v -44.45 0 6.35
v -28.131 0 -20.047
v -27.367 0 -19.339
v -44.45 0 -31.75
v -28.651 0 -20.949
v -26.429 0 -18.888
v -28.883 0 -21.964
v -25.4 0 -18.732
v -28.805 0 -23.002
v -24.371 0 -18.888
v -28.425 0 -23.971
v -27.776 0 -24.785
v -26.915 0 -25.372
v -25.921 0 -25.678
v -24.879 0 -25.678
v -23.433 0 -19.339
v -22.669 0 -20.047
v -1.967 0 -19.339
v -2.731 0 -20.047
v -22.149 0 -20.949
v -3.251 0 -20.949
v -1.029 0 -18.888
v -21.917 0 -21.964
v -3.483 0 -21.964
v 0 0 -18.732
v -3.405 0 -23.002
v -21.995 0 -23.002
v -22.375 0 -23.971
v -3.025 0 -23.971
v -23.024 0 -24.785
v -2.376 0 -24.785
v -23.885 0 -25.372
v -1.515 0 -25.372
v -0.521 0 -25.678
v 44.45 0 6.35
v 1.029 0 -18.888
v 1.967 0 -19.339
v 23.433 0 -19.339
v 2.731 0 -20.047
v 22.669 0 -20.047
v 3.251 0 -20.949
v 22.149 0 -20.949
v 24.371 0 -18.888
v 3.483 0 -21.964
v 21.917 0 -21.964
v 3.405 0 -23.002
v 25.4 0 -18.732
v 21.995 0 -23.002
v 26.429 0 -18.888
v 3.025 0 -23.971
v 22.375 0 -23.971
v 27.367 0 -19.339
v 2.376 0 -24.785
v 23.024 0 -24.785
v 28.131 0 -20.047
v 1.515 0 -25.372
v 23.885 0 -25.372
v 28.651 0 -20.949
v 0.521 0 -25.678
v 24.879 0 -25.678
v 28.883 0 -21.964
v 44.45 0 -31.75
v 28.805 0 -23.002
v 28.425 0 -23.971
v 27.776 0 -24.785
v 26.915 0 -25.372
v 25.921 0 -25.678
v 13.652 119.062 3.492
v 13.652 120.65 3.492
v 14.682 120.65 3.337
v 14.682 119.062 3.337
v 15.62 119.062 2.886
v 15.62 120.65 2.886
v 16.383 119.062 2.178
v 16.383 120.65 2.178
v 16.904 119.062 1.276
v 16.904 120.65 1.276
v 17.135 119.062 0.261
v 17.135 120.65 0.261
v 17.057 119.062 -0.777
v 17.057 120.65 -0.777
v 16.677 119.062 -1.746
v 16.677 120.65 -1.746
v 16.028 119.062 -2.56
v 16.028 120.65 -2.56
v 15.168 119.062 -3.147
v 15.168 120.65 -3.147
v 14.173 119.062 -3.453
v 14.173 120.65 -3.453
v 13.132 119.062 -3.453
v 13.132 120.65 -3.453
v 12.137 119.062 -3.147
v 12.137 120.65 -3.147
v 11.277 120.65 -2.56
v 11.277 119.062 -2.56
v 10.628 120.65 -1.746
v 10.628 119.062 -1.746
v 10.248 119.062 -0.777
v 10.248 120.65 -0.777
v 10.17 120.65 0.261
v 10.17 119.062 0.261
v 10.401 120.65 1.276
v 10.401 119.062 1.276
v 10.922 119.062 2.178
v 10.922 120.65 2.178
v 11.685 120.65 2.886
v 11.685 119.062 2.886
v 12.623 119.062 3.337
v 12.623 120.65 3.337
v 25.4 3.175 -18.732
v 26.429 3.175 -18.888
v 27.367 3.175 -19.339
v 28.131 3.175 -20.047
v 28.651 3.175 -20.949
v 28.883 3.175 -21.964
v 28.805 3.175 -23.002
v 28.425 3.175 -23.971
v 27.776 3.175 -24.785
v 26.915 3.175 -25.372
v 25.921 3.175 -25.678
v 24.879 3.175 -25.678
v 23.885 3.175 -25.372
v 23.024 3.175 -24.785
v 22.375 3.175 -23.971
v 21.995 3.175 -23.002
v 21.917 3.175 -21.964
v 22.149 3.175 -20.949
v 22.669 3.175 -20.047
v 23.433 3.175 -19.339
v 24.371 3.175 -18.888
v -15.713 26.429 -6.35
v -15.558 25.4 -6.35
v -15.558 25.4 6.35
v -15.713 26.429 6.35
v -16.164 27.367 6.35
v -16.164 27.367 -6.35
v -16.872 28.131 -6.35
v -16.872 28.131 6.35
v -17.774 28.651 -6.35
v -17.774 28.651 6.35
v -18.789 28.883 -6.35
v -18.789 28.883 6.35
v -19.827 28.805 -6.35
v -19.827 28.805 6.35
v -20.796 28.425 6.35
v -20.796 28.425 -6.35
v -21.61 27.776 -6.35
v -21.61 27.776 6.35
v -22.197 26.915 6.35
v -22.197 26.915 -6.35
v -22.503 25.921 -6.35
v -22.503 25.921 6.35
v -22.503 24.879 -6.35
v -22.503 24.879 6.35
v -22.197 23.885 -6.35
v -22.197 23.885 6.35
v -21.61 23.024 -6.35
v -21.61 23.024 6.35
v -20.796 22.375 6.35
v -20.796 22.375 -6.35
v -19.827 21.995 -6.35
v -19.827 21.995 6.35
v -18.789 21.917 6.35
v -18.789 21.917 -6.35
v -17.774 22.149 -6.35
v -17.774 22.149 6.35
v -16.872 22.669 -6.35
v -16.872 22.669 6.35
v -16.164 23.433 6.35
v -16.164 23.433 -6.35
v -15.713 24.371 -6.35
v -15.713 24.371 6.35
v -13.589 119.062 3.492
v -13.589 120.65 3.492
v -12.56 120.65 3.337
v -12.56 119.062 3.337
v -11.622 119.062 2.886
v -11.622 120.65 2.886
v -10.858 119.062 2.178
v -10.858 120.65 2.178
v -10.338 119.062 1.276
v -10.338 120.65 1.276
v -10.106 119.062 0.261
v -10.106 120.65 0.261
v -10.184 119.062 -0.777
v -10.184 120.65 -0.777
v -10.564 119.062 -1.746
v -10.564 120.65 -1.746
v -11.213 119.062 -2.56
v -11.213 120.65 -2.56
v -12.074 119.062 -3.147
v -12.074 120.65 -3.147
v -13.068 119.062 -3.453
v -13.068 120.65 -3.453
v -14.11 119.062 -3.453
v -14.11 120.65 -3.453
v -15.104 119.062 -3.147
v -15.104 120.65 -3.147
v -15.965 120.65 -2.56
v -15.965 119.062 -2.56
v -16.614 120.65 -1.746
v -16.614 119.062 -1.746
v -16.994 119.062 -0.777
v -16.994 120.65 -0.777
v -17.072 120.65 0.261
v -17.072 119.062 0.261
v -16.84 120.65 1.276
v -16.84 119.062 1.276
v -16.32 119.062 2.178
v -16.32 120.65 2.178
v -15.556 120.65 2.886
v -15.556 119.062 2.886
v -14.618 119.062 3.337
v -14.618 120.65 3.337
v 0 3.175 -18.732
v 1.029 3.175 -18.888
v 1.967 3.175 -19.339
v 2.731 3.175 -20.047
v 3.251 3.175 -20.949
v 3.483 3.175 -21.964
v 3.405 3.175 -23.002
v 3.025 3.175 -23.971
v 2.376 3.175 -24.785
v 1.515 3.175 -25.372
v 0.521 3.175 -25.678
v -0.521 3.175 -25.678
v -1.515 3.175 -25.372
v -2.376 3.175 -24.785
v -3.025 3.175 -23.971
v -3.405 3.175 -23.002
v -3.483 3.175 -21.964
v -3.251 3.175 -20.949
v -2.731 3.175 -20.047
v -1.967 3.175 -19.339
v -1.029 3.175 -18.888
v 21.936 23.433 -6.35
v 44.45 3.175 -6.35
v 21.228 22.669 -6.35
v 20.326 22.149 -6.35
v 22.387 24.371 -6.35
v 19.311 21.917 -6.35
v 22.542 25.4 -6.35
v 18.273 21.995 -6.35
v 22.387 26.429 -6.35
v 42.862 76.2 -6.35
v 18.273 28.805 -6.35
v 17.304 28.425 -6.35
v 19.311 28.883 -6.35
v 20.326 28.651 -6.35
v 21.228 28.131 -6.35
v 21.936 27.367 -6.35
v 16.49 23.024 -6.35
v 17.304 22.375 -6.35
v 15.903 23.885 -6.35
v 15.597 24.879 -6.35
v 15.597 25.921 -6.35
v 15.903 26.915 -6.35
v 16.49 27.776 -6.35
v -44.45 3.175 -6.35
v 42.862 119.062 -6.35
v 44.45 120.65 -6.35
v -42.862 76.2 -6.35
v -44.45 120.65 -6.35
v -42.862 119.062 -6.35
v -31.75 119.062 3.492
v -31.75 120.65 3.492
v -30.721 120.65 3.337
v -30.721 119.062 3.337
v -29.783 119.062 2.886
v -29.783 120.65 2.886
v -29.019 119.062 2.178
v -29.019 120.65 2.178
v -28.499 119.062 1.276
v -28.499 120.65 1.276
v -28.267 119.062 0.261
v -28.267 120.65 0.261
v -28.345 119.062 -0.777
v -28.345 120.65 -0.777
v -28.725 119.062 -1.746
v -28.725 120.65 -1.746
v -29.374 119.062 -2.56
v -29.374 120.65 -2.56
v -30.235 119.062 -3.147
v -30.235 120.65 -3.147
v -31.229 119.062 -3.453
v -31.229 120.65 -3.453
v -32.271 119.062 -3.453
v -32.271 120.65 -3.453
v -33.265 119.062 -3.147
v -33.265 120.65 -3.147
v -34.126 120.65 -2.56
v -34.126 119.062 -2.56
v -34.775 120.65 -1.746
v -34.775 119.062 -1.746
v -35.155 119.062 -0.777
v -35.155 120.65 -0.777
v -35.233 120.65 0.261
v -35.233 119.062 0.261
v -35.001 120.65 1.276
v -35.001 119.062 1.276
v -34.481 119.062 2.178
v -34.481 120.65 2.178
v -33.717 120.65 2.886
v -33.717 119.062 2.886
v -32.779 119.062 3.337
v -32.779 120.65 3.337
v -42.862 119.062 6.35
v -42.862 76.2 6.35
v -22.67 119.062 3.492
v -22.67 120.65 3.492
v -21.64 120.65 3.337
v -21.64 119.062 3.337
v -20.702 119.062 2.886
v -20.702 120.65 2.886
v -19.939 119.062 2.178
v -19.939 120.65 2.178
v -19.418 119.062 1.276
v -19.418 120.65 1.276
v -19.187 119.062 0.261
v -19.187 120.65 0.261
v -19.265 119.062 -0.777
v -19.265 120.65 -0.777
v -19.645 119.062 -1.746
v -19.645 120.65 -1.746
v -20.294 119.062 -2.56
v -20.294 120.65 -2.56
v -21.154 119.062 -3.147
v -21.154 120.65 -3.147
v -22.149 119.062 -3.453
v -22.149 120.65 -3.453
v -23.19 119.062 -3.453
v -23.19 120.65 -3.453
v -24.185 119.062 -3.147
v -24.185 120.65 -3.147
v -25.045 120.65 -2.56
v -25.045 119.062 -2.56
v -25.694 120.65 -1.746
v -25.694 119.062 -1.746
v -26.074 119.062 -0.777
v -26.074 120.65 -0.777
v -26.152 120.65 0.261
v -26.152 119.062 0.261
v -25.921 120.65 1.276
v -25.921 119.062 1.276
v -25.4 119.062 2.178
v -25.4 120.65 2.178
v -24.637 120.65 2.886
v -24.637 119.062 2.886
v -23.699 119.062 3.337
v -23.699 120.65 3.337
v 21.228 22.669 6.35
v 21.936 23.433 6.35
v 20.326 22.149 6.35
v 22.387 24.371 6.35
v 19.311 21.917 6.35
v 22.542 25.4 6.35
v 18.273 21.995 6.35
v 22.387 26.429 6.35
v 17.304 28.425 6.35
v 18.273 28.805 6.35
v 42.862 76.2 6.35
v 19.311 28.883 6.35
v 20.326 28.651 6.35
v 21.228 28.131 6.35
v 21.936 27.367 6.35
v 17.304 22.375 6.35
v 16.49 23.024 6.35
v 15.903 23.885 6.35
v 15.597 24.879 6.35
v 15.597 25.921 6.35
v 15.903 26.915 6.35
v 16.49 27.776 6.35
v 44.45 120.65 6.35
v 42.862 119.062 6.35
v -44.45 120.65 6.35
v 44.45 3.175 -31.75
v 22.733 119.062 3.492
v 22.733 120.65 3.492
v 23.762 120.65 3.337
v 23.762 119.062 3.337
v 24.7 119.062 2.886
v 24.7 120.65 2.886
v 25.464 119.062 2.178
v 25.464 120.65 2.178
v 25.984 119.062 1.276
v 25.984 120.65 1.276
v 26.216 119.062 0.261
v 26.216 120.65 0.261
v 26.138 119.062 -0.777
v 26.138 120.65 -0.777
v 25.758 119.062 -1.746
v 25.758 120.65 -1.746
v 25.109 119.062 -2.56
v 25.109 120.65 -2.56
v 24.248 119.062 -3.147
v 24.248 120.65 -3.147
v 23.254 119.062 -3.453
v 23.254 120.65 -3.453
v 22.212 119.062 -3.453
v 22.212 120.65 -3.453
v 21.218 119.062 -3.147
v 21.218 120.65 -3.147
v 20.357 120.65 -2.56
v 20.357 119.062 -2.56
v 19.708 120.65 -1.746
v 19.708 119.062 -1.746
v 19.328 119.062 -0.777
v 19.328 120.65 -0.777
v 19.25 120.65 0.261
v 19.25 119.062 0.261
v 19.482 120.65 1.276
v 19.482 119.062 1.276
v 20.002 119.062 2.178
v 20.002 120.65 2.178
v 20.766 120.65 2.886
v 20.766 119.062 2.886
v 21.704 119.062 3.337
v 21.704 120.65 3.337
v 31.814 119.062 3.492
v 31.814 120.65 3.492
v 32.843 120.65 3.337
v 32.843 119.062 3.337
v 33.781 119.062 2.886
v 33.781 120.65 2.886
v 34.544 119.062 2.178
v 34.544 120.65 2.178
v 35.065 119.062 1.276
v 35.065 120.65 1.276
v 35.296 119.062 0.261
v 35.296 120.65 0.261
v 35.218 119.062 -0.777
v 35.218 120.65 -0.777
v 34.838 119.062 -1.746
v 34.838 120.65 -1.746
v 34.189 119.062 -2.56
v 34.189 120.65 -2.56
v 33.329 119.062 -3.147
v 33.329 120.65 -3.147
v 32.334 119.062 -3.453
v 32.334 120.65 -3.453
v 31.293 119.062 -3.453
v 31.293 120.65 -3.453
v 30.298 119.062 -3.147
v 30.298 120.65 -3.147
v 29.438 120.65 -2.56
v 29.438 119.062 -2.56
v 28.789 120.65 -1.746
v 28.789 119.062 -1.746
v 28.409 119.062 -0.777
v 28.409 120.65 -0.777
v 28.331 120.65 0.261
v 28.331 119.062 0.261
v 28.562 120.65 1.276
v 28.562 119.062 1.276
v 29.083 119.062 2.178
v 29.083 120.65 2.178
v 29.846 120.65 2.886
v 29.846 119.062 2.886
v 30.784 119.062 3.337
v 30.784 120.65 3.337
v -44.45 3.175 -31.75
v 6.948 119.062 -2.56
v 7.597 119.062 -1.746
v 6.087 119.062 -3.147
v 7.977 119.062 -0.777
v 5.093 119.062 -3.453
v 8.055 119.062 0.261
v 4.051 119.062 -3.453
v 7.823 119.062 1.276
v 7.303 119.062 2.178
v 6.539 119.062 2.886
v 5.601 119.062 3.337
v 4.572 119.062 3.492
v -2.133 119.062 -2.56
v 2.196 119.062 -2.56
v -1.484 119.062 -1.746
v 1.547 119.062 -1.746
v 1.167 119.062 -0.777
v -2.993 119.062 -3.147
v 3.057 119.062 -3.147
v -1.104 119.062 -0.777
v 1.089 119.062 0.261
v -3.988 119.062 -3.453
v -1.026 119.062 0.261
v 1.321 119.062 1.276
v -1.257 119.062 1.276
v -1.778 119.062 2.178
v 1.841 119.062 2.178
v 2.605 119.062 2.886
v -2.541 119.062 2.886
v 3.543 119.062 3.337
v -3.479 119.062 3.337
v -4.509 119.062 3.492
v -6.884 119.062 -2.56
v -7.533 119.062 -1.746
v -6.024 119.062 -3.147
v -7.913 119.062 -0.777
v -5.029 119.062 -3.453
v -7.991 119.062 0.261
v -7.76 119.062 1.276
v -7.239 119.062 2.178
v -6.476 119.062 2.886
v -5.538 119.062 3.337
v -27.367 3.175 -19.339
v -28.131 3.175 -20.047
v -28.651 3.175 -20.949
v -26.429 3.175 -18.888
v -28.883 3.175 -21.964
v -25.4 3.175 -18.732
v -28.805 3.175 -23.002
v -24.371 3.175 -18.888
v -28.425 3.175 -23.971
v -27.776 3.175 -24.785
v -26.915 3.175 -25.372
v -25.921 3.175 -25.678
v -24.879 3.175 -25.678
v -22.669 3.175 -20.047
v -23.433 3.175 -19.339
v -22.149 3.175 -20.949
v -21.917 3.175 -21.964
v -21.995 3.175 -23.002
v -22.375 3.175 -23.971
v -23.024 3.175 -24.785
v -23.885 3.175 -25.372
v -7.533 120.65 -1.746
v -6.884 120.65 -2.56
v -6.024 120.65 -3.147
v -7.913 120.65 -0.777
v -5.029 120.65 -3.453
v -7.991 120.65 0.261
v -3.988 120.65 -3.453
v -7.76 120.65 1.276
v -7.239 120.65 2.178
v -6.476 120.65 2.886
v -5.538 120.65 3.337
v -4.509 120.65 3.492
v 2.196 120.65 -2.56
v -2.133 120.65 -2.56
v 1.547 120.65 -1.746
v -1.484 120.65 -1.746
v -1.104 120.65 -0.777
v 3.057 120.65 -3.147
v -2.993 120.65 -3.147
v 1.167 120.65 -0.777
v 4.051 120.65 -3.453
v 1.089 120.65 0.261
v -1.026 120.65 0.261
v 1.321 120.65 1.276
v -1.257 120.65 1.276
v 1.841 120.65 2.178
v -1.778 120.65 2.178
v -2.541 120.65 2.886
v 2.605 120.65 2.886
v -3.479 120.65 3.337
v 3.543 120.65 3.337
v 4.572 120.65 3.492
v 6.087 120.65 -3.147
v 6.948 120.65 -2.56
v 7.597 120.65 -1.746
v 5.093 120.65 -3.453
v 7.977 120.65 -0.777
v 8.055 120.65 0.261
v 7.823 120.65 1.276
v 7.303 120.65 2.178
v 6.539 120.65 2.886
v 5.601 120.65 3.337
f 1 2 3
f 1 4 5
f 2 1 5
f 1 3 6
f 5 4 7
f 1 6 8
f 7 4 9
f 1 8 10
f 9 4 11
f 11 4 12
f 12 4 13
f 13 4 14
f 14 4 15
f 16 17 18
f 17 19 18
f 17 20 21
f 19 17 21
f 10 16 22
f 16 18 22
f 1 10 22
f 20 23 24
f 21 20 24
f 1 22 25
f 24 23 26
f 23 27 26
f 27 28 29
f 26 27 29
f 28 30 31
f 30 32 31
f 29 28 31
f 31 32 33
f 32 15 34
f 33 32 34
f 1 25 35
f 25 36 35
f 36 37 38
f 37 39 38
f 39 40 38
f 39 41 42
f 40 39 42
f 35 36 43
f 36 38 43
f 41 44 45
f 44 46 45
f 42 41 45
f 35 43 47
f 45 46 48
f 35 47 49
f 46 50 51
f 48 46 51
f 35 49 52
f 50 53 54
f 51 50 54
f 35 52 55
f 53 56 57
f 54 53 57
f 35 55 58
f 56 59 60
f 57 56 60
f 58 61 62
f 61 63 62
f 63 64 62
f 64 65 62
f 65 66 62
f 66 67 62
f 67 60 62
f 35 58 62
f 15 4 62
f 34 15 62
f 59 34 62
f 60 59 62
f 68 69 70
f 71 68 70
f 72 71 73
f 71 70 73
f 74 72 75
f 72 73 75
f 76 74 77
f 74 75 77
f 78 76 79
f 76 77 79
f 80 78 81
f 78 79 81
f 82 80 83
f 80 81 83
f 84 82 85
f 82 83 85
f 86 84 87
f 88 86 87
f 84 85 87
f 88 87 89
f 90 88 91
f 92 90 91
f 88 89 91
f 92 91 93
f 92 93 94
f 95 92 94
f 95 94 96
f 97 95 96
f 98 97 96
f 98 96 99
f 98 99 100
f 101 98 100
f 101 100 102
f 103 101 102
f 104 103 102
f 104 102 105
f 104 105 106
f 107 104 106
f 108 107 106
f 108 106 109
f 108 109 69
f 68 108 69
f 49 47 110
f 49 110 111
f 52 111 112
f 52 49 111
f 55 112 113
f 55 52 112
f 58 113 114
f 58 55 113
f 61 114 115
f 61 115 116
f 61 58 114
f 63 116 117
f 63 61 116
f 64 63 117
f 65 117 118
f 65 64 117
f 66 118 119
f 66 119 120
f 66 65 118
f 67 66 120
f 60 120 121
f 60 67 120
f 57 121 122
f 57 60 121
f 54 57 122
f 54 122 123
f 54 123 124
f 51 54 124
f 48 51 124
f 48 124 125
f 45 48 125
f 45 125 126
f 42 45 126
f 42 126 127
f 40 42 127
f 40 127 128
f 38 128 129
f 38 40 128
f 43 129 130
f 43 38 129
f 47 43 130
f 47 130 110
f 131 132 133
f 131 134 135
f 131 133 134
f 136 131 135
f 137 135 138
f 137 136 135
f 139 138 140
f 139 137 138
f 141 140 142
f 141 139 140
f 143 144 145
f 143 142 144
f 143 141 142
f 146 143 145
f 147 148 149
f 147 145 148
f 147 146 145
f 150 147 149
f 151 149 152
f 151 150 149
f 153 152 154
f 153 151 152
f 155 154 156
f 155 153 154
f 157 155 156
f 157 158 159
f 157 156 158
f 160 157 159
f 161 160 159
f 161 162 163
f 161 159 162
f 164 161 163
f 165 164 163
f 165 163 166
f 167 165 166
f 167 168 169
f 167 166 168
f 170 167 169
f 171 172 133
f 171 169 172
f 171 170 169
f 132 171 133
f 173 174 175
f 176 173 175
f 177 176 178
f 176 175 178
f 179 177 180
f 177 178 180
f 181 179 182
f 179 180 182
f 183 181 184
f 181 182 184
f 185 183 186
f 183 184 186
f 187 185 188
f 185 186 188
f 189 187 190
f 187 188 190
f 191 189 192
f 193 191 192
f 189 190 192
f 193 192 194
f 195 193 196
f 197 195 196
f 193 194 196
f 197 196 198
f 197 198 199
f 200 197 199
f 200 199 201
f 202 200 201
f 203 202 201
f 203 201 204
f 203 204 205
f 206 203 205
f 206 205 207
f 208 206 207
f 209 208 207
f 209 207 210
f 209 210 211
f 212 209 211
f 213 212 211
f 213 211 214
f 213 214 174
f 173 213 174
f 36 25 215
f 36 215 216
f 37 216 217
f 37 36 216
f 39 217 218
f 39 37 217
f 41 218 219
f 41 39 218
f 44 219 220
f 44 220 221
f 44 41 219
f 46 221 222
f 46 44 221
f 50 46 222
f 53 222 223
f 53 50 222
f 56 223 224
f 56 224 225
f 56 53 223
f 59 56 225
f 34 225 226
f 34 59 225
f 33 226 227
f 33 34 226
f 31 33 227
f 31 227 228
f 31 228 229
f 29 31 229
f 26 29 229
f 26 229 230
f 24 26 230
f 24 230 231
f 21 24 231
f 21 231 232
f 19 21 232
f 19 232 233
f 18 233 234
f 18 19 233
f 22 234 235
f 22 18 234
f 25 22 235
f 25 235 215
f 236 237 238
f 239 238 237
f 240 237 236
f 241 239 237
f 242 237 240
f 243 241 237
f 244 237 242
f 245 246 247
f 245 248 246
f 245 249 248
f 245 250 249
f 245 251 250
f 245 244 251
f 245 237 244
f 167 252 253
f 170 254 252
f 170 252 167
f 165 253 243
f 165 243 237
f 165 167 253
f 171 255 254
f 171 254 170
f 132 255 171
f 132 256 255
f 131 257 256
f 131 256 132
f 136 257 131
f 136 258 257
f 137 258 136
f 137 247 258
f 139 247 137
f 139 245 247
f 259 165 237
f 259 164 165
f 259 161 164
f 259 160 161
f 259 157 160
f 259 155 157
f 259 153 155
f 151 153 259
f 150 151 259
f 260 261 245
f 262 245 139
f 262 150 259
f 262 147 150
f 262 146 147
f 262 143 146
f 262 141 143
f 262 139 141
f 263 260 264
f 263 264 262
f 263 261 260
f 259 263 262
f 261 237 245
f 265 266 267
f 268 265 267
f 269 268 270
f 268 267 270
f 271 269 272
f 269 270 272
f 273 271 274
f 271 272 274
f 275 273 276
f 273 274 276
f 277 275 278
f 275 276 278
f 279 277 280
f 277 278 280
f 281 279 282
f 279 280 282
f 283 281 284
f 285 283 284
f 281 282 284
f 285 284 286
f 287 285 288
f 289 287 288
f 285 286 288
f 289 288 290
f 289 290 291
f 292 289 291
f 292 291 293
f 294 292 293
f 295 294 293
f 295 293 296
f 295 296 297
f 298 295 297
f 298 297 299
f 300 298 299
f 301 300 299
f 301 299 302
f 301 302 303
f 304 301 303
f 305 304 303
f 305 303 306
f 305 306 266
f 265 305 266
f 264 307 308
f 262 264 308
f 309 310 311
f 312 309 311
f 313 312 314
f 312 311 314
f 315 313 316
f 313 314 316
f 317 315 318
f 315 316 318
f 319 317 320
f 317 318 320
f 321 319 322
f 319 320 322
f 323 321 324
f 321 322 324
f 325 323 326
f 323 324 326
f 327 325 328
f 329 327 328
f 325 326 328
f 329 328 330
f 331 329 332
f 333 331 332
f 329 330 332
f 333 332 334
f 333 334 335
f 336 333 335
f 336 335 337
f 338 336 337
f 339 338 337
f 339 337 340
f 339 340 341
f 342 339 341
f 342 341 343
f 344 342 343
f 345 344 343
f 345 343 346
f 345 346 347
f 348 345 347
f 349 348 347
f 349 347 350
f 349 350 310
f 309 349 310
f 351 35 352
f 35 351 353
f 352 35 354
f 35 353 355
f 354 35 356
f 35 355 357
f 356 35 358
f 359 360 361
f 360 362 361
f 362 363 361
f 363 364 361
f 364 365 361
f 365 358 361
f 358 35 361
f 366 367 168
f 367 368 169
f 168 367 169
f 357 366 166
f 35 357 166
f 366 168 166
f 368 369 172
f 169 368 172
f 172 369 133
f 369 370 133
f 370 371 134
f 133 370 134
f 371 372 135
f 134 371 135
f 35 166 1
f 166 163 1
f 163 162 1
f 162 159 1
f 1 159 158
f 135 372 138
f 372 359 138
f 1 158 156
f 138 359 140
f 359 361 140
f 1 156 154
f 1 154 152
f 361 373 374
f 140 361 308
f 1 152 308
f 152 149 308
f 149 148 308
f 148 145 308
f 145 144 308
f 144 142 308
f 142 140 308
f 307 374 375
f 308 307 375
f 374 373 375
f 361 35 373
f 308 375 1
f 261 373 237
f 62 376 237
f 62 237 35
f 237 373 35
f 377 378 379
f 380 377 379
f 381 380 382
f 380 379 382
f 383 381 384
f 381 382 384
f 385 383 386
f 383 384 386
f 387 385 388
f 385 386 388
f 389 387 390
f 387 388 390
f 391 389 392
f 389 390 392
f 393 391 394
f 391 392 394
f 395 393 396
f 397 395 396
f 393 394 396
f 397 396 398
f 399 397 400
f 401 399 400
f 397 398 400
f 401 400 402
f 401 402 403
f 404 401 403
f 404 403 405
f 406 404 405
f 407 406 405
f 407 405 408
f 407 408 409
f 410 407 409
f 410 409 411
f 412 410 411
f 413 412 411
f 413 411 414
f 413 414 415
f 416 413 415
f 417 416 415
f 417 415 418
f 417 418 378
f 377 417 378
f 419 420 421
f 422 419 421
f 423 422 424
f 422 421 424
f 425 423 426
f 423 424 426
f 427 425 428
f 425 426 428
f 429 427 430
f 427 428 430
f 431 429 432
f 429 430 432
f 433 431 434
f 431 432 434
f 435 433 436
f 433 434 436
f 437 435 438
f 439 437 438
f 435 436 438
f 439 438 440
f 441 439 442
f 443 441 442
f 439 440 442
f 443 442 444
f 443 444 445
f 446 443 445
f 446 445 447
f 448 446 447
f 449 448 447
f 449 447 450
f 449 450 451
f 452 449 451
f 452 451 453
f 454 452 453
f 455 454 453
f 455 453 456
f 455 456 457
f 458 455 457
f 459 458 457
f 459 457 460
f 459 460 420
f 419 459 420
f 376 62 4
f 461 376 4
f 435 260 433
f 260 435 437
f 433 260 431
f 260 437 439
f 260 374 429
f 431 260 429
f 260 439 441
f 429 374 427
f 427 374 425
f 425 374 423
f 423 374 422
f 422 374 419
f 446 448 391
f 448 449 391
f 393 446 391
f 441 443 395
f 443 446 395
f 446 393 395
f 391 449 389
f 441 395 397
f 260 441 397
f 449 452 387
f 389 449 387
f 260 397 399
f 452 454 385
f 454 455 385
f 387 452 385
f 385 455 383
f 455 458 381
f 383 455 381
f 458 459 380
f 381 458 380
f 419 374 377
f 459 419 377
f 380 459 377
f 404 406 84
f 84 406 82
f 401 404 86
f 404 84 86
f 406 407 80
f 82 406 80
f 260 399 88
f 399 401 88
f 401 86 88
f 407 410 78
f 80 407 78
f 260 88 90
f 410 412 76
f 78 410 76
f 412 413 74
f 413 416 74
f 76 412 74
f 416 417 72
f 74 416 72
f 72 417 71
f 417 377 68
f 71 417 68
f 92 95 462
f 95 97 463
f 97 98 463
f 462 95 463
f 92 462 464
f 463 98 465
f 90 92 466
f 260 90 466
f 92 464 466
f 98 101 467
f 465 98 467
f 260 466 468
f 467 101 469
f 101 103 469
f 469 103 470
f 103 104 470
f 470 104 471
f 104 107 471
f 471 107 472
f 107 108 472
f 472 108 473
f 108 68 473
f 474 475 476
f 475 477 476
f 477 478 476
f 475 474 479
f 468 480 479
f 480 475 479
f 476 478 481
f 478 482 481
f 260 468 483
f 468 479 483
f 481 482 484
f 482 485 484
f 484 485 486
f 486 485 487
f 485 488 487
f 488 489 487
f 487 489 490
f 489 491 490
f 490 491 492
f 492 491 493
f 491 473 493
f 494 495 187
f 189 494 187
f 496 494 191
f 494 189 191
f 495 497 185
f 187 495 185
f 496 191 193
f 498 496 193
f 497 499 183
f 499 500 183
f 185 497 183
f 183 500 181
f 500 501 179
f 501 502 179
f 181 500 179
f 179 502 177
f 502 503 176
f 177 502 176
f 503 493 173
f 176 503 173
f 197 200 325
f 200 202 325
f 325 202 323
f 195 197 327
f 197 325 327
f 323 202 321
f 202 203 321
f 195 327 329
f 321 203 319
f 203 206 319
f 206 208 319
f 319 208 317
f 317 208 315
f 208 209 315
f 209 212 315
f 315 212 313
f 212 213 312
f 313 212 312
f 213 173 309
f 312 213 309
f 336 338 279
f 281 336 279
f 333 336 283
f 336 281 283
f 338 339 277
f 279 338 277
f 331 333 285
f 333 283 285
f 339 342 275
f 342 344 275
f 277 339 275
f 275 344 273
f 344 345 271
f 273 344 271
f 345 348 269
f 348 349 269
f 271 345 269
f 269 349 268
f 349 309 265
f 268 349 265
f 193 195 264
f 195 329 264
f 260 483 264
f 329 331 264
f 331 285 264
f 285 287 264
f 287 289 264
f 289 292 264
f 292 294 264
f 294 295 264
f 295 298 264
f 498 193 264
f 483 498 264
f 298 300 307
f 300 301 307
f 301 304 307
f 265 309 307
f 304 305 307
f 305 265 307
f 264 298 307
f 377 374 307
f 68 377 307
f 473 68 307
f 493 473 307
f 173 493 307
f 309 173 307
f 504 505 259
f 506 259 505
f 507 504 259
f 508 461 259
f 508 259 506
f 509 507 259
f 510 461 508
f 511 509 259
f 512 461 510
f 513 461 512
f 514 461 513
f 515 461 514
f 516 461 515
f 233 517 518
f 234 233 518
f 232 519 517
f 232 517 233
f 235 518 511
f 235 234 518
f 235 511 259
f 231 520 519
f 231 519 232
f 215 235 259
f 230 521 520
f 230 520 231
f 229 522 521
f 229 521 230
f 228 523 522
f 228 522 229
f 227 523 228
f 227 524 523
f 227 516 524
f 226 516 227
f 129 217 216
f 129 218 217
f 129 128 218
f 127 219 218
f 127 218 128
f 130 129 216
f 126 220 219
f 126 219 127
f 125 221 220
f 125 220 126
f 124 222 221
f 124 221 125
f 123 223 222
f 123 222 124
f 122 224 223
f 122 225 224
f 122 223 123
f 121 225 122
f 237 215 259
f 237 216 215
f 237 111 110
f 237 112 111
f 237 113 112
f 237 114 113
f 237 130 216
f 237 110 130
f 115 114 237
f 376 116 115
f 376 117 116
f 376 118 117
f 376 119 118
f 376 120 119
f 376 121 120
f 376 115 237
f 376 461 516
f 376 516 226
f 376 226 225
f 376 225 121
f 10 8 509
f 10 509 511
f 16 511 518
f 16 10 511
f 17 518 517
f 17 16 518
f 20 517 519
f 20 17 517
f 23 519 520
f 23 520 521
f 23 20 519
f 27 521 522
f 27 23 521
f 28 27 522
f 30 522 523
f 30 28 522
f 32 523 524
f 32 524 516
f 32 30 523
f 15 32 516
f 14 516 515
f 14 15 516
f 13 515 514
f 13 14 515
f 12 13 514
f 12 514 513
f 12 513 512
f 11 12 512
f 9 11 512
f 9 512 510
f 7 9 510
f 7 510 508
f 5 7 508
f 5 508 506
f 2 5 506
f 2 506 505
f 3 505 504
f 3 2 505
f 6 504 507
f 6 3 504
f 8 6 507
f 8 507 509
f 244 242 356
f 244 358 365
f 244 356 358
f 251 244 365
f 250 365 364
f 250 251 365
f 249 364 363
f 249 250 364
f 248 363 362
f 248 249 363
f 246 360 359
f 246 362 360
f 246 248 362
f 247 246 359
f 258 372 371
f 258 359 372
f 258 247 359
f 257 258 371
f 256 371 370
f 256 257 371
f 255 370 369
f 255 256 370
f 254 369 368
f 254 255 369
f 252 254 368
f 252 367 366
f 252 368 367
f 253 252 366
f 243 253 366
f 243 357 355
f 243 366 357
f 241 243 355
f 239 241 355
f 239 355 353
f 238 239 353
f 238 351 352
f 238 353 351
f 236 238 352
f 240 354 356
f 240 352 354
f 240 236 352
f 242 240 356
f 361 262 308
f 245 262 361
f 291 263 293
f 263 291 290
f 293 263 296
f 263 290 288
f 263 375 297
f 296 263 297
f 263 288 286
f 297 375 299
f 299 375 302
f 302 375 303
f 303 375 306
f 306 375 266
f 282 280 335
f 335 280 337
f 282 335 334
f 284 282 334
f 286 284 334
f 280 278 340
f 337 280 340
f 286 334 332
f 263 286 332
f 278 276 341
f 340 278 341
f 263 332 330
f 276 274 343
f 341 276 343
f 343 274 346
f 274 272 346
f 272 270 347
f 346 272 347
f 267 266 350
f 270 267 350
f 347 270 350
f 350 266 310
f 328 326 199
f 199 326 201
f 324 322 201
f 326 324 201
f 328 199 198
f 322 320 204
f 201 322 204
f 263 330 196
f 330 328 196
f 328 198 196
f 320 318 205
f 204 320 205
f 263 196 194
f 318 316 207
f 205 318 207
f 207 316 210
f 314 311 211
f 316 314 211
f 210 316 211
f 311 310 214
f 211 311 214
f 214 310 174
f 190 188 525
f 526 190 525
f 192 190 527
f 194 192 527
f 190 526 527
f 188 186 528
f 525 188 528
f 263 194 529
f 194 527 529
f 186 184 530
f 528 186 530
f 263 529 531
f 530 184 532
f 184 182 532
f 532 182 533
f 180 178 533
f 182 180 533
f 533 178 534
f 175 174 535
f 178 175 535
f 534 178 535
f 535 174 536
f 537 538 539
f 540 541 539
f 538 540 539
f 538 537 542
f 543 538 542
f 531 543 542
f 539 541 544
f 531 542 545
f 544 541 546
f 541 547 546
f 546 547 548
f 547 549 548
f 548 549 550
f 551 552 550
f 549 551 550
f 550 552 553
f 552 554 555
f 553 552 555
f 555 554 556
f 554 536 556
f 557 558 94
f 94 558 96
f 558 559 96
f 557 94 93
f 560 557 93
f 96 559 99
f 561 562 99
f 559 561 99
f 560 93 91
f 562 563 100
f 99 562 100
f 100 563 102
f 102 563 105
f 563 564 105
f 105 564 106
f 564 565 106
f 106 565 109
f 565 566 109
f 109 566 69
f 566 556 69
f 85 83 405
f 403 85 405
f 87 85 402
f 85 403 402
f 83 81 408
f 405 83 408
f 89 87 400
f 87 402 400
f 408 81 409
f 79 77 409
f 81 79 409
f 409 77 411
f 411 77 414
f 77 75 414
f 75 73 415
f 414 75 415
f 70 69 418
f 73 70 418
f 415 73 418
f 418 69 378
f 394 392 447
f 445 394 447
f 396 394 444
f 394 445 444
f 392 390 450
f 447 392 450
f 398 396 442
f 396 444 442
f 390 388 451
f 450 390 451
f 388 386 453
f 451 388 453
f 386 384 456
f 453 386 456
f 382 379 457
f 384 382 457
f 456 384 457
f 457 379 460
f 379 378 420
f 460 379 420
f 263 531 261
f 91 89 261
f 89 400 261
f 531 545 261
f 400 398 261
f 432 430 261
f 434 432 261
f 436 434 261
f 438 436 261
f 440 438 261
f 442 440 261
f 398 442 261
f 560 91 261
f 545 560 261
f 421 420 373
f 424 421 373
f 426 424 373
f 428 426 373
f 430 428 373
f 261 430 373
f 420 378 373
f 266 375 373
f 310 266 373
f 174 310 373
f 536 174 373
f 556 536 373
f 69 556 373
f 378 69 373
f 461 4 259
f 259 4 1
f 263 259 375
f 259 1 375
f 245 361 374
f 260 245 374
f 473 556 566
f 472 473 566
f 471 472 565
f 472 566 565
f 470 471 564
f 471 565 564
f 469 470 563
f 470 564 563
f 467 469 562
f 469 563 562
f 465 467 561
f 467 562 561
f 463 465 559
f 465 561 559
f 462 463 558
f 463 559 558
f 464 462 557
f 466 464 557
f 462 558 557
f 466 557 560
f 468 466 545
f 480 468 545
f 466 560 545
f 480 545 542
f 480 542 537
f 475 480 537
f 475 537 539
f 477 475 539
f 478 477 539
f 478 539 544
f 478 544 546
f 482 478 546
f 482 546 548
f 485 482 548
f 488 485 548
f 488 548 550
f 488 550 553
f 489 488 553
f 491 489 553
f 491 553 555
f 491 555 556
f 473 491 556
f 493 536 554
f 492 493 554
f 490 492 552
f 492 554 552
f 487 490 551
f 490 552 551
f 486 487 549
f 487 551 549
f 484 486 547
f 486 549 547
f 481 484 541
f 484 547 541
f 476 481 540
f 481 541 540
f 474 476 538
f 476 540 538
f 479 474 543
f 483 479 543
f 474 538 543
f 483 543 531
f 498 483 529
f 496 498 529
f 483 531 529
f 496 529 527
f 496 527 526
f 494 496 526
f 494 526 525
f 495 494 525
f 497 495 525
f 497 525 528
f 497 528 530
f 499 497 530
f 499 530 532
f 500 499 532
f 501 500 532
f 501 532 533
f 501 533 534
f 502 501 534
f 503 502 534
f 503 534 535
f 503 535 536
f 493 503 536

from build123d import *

# Parameters (mm, degrees)
SKETCH1_W               = 88.9
SKETCH1_H               = 12.7
BOSS_EXTRUDE1_DEPTH     = 76.2
SKETCH2_R               = 3.4925
BOSS_EXTRUDE4_DEPTH     = 3.175
BOSS_EXTRUDE5_DEPTH     = 12.7
CUT_EXTRUDE1_REACH      = 134.44
SKETCH4_R               = 3.4925
CUT_EXTRUDE2_DEPTH      = 133.439750453
CUT_EXTRUDE2_DEPTH_BACK = 133.439750453
SKETCH5_R               = 3.4925


with BuildPart() as part:
    # Sketch1 → Boss-Extrude1 (new body)
    with BuildSketch(Plane(origin=(0, 0, 0), x_dir=(1, 0, 0), z_dir=(0, 1, 0))):
        Rectangle(SKETCH1_W, SKETCH1_H)
    extrude(amount=BOSS_EXTRUDE1_DEPTH)

    # Sketch2 → Boss-Extrude4 (add)
    with BuildSketch(Plane(origin=(0, 0, 0), x_dir=(1, 0, 0), z_dir=(0, 1, 0))):
        Polygon((-44.45, 22.225), (-44.45, 6.35), (44.45, 6.35), (44.45, 31.75), (-44.45, 31.75), align=None)
        with Locations(Location((-25.4, 22.225, 0), (0, 0, 270))):
            Circle(SKETCH2_R, mode=Mode.SUBTRACT)
        with Locations(Location((0, 22.225, 0), (0, 0, 270))):
            Circle(SKETCH2_R, mode=Mode.SUBTRACT)
        with Locations(Location((25.4, 22.225, 0), (0, 0, 270))):
            Circle(SKETCH2_R, mode=Mode.SUBTRACT)
    extrude(amount=BOSS_EXTRUDE4_DEPTH)

    # Sketch3 → Boss-Extrude5 (add)
    with BuildSketch(Plane.XY.offset(6.35)):
        Polygon((-44.45, 76.2), (-44.45, 120.65), (44.45, 120.65), (44.45, 76.2), (42.8625, 76.2), (42.8625, 119.0625), (-42.8625, 119.0625), (-42.8625, 76.2), align=None)
    extrude(amount=-BOSS_EXTRUDE5_DEPTH)

    # Sketch4 → Cut-Extrude1 (cut, up to next)
    with BuildSketch(Plane(origin=(0, 120.65, 0), x_dir=(1, 0, 0), z_dir=(0, 1, 0)), mode=Mode.PRIVATE) as cut_extrude1_sk1:
        with Locations(Location((-31.75, 0, 0), (0, 0, 270))):
            Circle(SKETCH4_R)
    cut_extrude1_tool1 = extrude(cut_extrude1_sk1.sketch, amount=-CUT_EXTRUDE1_REACH, mode=Mode.PRIVATE) & part.part
    # Sketch4 → Cut-Extrude1 (cut, up to next)
    with BuildSketch(Plane(origin=(0, 120.65, 0), x_dir=(1, 0, 0), z_dir=(0, 1, 0)), mode=Mode.PRIVATE) as cut_extrude1_sk2:
        with Locations(Location((-22.6695, 0, 0), (0, 0, 270))):
            Circle(SKETCH4_R)
    cut_extrude1_tool2 = extrude(cut_extrude1_sk2.sketch, amount=-CUT_EXTRUDE1_REACH, mode=Mode.PRIVATE) & part.part
    # Sketch4 → Cut-Extrude1 (cut, up to next)
    with BuildSketch(Plane(origin=(0, 120.65, 0), x_dir=(1, 0, 0), z_dir=(0, 1, 0)), mode=Mode.PRIVATE) as cut_extrude1_sk3:
        with Locations(Location((-13.589, 0, 0), (0, 0, 270))):
            Circle(SKETCH4_R)
    cut_extrude1_tool3 = extrude(cut_extrude1_sk3.sketch, amount=-CUT_EXTRUDE1_REACH, mode=Mode.PRIVATE) & part.part
    # Sketch4 → Cut-Extrude1 (cut, up to next)
    with BuildSketch(Plane(origin=(0, 120.65, 0), x_dir=(1, 0, 0), z_dir=(0, 1, 0)), mode=Mode.PRIVATE) as cut_extrude1_sk4:
        with Locations(Location((-4.5085, 0, 0), (0, 0, 270))):
            Circle(SKETCH4_R)
    cut_extrude1_tool4 = extrude(cut_extrude1_sk4.sketch, amount=-CUT_EXTRUDE1_REACH, mode=Mode.PRIVATE) & part.part
    # Sketch4 → Cut-Extrude1 (cut, up to next)
    with BuildSketch(Plane(origin=(0, 120.65, 0), x_dir=(1, 0, 0), z_dir=(0, 1, 0)), mode=Mode.PRIVATE) as cut_extrude1_sk5:
        with Locations(Location((4.572, 0, 0), (0, 0, 270))):
            Circle(SKETCH4_R)
    cut_extrude1_tool5 = extrude(cut_extrude1_sk5.sketch, amount=-CUT_EXTRUDE1_REACH, mode=Mode.PRIVATE) & part.part
    # Sketch4 → Cut-Extrude1 (cut, up to next)
    with BuildSketch(Plane(origin=(0, 120.65, 0), x_dir=(1, 0, 0), z_dir=(0, 1, 0)), mode=Mode.PRIVATE) as cut_extrude1_sk6:
        with Locations(Location((13.6525, 0, 0), (0, 0, 270))):
            Circle(SKETCH4_R)
    cut_extrude1_tool6 = extrude(cut_extrude1_sk6.sketch, amount=-CUT_EXTRUDE1_REACH, mode=Mode.PRIVATE) & part.part
    # Sketch4 → Cut-Extrude1 (cut, up to next)
    with BuildSketch(Plane(origin=(0, 120.65, 0), x_dir=(1, 0, 0), z_dir=(0, 1, 0)), mode=Mode.PRIVATE) as cut_extrude1_sk7:
        with Locations(Location((22.733, 0, 0), (0, 0, 270))):
            Circle(SKETCH4_R)
    cut_extrude1_tool7 = extrude(cut_extrude1_sk7.sketch, amount=-CUT_EXTRUDE1_REACH, mode=Mode.PRIVATE) & part.part
    # Sketch4 → Cut-Extrude1 (cut, up to next)
    with BuildSketch(Plane(origin=(0, 120.65, 0), x_dir=(1, 0, 0), z_dir=(0, 1, 0)), mode=Mode.PRIVATE) as cut_extrude1_sk8:
        with Locations(Location((31.8135, 0, 0), (0, 0, 270))):
            Circle(SKETCH4_R)
    cut_extrude1_tool8 = extrude(cut_extrude1_sk8.sketch, amount=-CUT_EXTRUDE1_REACH, mode=Mode.PRIVATE) & part.part
    add(cut_extrude1_tool1.solids().sort_by_distance((-31.75, 120.65, 0))[0], mode=Mode.SUBTRACT)
    add(cut_extrude1_tool2.solids().sort_by_distance((-22.6695, 120.65, 0))[0], mode=Mode.SUBTRACT)
    add(cut_extrude1_tool3.solids().sort_by_distance((-13.589, 120.65, 0))[0], mode=Mode.SUBTRACT)
    add(cut_extrude1_tool4.solids().sort_by_distance((-4.5085, 120.65, 0))[0], mode=Mode.SUBTRACT)
    add(cut_extrude1_tool5.solids().sort_by_distance((4.572, 120.65, 0))[0], mode=Mode.SUBTRACT)
    add(cut_extrude1_tool6.solids().sort_by_distance((13.6525, 120.65, 0))[0], mode=Mode.SUBTRACT)
    add(cut_extrude1_tool7.solids().sort_by_distance((22.733, 120.65, 0))[0], mode=Mode.SUBTRACT)
    add(cut_extrude1_tool8.solids().sort_by_distance((31.8135, 120.65, 0))[0], mode=Mode.SUBTRACT)

    # Sketch5 → Cut-Extrude2 (cut, two sides: drawn at the far end of the back side and taken through both)
    with BuildSketch(Plane.XY.offset(-CUT_EXTRUDE2_DEPTH_BACK)):
        with Locations((-19.05, 25.4)):
            Circle(SKETCH5_R)
        with Locations((19.05, 25.4)):
            Circle(SKETCH5_R)
    extrude(amount=CUT_EXTRUDE2_DEPTH + CUT_EXTRUDE2_DEPTH_BACK, mode=Mode.SUBTRACT)


solid = part.part
